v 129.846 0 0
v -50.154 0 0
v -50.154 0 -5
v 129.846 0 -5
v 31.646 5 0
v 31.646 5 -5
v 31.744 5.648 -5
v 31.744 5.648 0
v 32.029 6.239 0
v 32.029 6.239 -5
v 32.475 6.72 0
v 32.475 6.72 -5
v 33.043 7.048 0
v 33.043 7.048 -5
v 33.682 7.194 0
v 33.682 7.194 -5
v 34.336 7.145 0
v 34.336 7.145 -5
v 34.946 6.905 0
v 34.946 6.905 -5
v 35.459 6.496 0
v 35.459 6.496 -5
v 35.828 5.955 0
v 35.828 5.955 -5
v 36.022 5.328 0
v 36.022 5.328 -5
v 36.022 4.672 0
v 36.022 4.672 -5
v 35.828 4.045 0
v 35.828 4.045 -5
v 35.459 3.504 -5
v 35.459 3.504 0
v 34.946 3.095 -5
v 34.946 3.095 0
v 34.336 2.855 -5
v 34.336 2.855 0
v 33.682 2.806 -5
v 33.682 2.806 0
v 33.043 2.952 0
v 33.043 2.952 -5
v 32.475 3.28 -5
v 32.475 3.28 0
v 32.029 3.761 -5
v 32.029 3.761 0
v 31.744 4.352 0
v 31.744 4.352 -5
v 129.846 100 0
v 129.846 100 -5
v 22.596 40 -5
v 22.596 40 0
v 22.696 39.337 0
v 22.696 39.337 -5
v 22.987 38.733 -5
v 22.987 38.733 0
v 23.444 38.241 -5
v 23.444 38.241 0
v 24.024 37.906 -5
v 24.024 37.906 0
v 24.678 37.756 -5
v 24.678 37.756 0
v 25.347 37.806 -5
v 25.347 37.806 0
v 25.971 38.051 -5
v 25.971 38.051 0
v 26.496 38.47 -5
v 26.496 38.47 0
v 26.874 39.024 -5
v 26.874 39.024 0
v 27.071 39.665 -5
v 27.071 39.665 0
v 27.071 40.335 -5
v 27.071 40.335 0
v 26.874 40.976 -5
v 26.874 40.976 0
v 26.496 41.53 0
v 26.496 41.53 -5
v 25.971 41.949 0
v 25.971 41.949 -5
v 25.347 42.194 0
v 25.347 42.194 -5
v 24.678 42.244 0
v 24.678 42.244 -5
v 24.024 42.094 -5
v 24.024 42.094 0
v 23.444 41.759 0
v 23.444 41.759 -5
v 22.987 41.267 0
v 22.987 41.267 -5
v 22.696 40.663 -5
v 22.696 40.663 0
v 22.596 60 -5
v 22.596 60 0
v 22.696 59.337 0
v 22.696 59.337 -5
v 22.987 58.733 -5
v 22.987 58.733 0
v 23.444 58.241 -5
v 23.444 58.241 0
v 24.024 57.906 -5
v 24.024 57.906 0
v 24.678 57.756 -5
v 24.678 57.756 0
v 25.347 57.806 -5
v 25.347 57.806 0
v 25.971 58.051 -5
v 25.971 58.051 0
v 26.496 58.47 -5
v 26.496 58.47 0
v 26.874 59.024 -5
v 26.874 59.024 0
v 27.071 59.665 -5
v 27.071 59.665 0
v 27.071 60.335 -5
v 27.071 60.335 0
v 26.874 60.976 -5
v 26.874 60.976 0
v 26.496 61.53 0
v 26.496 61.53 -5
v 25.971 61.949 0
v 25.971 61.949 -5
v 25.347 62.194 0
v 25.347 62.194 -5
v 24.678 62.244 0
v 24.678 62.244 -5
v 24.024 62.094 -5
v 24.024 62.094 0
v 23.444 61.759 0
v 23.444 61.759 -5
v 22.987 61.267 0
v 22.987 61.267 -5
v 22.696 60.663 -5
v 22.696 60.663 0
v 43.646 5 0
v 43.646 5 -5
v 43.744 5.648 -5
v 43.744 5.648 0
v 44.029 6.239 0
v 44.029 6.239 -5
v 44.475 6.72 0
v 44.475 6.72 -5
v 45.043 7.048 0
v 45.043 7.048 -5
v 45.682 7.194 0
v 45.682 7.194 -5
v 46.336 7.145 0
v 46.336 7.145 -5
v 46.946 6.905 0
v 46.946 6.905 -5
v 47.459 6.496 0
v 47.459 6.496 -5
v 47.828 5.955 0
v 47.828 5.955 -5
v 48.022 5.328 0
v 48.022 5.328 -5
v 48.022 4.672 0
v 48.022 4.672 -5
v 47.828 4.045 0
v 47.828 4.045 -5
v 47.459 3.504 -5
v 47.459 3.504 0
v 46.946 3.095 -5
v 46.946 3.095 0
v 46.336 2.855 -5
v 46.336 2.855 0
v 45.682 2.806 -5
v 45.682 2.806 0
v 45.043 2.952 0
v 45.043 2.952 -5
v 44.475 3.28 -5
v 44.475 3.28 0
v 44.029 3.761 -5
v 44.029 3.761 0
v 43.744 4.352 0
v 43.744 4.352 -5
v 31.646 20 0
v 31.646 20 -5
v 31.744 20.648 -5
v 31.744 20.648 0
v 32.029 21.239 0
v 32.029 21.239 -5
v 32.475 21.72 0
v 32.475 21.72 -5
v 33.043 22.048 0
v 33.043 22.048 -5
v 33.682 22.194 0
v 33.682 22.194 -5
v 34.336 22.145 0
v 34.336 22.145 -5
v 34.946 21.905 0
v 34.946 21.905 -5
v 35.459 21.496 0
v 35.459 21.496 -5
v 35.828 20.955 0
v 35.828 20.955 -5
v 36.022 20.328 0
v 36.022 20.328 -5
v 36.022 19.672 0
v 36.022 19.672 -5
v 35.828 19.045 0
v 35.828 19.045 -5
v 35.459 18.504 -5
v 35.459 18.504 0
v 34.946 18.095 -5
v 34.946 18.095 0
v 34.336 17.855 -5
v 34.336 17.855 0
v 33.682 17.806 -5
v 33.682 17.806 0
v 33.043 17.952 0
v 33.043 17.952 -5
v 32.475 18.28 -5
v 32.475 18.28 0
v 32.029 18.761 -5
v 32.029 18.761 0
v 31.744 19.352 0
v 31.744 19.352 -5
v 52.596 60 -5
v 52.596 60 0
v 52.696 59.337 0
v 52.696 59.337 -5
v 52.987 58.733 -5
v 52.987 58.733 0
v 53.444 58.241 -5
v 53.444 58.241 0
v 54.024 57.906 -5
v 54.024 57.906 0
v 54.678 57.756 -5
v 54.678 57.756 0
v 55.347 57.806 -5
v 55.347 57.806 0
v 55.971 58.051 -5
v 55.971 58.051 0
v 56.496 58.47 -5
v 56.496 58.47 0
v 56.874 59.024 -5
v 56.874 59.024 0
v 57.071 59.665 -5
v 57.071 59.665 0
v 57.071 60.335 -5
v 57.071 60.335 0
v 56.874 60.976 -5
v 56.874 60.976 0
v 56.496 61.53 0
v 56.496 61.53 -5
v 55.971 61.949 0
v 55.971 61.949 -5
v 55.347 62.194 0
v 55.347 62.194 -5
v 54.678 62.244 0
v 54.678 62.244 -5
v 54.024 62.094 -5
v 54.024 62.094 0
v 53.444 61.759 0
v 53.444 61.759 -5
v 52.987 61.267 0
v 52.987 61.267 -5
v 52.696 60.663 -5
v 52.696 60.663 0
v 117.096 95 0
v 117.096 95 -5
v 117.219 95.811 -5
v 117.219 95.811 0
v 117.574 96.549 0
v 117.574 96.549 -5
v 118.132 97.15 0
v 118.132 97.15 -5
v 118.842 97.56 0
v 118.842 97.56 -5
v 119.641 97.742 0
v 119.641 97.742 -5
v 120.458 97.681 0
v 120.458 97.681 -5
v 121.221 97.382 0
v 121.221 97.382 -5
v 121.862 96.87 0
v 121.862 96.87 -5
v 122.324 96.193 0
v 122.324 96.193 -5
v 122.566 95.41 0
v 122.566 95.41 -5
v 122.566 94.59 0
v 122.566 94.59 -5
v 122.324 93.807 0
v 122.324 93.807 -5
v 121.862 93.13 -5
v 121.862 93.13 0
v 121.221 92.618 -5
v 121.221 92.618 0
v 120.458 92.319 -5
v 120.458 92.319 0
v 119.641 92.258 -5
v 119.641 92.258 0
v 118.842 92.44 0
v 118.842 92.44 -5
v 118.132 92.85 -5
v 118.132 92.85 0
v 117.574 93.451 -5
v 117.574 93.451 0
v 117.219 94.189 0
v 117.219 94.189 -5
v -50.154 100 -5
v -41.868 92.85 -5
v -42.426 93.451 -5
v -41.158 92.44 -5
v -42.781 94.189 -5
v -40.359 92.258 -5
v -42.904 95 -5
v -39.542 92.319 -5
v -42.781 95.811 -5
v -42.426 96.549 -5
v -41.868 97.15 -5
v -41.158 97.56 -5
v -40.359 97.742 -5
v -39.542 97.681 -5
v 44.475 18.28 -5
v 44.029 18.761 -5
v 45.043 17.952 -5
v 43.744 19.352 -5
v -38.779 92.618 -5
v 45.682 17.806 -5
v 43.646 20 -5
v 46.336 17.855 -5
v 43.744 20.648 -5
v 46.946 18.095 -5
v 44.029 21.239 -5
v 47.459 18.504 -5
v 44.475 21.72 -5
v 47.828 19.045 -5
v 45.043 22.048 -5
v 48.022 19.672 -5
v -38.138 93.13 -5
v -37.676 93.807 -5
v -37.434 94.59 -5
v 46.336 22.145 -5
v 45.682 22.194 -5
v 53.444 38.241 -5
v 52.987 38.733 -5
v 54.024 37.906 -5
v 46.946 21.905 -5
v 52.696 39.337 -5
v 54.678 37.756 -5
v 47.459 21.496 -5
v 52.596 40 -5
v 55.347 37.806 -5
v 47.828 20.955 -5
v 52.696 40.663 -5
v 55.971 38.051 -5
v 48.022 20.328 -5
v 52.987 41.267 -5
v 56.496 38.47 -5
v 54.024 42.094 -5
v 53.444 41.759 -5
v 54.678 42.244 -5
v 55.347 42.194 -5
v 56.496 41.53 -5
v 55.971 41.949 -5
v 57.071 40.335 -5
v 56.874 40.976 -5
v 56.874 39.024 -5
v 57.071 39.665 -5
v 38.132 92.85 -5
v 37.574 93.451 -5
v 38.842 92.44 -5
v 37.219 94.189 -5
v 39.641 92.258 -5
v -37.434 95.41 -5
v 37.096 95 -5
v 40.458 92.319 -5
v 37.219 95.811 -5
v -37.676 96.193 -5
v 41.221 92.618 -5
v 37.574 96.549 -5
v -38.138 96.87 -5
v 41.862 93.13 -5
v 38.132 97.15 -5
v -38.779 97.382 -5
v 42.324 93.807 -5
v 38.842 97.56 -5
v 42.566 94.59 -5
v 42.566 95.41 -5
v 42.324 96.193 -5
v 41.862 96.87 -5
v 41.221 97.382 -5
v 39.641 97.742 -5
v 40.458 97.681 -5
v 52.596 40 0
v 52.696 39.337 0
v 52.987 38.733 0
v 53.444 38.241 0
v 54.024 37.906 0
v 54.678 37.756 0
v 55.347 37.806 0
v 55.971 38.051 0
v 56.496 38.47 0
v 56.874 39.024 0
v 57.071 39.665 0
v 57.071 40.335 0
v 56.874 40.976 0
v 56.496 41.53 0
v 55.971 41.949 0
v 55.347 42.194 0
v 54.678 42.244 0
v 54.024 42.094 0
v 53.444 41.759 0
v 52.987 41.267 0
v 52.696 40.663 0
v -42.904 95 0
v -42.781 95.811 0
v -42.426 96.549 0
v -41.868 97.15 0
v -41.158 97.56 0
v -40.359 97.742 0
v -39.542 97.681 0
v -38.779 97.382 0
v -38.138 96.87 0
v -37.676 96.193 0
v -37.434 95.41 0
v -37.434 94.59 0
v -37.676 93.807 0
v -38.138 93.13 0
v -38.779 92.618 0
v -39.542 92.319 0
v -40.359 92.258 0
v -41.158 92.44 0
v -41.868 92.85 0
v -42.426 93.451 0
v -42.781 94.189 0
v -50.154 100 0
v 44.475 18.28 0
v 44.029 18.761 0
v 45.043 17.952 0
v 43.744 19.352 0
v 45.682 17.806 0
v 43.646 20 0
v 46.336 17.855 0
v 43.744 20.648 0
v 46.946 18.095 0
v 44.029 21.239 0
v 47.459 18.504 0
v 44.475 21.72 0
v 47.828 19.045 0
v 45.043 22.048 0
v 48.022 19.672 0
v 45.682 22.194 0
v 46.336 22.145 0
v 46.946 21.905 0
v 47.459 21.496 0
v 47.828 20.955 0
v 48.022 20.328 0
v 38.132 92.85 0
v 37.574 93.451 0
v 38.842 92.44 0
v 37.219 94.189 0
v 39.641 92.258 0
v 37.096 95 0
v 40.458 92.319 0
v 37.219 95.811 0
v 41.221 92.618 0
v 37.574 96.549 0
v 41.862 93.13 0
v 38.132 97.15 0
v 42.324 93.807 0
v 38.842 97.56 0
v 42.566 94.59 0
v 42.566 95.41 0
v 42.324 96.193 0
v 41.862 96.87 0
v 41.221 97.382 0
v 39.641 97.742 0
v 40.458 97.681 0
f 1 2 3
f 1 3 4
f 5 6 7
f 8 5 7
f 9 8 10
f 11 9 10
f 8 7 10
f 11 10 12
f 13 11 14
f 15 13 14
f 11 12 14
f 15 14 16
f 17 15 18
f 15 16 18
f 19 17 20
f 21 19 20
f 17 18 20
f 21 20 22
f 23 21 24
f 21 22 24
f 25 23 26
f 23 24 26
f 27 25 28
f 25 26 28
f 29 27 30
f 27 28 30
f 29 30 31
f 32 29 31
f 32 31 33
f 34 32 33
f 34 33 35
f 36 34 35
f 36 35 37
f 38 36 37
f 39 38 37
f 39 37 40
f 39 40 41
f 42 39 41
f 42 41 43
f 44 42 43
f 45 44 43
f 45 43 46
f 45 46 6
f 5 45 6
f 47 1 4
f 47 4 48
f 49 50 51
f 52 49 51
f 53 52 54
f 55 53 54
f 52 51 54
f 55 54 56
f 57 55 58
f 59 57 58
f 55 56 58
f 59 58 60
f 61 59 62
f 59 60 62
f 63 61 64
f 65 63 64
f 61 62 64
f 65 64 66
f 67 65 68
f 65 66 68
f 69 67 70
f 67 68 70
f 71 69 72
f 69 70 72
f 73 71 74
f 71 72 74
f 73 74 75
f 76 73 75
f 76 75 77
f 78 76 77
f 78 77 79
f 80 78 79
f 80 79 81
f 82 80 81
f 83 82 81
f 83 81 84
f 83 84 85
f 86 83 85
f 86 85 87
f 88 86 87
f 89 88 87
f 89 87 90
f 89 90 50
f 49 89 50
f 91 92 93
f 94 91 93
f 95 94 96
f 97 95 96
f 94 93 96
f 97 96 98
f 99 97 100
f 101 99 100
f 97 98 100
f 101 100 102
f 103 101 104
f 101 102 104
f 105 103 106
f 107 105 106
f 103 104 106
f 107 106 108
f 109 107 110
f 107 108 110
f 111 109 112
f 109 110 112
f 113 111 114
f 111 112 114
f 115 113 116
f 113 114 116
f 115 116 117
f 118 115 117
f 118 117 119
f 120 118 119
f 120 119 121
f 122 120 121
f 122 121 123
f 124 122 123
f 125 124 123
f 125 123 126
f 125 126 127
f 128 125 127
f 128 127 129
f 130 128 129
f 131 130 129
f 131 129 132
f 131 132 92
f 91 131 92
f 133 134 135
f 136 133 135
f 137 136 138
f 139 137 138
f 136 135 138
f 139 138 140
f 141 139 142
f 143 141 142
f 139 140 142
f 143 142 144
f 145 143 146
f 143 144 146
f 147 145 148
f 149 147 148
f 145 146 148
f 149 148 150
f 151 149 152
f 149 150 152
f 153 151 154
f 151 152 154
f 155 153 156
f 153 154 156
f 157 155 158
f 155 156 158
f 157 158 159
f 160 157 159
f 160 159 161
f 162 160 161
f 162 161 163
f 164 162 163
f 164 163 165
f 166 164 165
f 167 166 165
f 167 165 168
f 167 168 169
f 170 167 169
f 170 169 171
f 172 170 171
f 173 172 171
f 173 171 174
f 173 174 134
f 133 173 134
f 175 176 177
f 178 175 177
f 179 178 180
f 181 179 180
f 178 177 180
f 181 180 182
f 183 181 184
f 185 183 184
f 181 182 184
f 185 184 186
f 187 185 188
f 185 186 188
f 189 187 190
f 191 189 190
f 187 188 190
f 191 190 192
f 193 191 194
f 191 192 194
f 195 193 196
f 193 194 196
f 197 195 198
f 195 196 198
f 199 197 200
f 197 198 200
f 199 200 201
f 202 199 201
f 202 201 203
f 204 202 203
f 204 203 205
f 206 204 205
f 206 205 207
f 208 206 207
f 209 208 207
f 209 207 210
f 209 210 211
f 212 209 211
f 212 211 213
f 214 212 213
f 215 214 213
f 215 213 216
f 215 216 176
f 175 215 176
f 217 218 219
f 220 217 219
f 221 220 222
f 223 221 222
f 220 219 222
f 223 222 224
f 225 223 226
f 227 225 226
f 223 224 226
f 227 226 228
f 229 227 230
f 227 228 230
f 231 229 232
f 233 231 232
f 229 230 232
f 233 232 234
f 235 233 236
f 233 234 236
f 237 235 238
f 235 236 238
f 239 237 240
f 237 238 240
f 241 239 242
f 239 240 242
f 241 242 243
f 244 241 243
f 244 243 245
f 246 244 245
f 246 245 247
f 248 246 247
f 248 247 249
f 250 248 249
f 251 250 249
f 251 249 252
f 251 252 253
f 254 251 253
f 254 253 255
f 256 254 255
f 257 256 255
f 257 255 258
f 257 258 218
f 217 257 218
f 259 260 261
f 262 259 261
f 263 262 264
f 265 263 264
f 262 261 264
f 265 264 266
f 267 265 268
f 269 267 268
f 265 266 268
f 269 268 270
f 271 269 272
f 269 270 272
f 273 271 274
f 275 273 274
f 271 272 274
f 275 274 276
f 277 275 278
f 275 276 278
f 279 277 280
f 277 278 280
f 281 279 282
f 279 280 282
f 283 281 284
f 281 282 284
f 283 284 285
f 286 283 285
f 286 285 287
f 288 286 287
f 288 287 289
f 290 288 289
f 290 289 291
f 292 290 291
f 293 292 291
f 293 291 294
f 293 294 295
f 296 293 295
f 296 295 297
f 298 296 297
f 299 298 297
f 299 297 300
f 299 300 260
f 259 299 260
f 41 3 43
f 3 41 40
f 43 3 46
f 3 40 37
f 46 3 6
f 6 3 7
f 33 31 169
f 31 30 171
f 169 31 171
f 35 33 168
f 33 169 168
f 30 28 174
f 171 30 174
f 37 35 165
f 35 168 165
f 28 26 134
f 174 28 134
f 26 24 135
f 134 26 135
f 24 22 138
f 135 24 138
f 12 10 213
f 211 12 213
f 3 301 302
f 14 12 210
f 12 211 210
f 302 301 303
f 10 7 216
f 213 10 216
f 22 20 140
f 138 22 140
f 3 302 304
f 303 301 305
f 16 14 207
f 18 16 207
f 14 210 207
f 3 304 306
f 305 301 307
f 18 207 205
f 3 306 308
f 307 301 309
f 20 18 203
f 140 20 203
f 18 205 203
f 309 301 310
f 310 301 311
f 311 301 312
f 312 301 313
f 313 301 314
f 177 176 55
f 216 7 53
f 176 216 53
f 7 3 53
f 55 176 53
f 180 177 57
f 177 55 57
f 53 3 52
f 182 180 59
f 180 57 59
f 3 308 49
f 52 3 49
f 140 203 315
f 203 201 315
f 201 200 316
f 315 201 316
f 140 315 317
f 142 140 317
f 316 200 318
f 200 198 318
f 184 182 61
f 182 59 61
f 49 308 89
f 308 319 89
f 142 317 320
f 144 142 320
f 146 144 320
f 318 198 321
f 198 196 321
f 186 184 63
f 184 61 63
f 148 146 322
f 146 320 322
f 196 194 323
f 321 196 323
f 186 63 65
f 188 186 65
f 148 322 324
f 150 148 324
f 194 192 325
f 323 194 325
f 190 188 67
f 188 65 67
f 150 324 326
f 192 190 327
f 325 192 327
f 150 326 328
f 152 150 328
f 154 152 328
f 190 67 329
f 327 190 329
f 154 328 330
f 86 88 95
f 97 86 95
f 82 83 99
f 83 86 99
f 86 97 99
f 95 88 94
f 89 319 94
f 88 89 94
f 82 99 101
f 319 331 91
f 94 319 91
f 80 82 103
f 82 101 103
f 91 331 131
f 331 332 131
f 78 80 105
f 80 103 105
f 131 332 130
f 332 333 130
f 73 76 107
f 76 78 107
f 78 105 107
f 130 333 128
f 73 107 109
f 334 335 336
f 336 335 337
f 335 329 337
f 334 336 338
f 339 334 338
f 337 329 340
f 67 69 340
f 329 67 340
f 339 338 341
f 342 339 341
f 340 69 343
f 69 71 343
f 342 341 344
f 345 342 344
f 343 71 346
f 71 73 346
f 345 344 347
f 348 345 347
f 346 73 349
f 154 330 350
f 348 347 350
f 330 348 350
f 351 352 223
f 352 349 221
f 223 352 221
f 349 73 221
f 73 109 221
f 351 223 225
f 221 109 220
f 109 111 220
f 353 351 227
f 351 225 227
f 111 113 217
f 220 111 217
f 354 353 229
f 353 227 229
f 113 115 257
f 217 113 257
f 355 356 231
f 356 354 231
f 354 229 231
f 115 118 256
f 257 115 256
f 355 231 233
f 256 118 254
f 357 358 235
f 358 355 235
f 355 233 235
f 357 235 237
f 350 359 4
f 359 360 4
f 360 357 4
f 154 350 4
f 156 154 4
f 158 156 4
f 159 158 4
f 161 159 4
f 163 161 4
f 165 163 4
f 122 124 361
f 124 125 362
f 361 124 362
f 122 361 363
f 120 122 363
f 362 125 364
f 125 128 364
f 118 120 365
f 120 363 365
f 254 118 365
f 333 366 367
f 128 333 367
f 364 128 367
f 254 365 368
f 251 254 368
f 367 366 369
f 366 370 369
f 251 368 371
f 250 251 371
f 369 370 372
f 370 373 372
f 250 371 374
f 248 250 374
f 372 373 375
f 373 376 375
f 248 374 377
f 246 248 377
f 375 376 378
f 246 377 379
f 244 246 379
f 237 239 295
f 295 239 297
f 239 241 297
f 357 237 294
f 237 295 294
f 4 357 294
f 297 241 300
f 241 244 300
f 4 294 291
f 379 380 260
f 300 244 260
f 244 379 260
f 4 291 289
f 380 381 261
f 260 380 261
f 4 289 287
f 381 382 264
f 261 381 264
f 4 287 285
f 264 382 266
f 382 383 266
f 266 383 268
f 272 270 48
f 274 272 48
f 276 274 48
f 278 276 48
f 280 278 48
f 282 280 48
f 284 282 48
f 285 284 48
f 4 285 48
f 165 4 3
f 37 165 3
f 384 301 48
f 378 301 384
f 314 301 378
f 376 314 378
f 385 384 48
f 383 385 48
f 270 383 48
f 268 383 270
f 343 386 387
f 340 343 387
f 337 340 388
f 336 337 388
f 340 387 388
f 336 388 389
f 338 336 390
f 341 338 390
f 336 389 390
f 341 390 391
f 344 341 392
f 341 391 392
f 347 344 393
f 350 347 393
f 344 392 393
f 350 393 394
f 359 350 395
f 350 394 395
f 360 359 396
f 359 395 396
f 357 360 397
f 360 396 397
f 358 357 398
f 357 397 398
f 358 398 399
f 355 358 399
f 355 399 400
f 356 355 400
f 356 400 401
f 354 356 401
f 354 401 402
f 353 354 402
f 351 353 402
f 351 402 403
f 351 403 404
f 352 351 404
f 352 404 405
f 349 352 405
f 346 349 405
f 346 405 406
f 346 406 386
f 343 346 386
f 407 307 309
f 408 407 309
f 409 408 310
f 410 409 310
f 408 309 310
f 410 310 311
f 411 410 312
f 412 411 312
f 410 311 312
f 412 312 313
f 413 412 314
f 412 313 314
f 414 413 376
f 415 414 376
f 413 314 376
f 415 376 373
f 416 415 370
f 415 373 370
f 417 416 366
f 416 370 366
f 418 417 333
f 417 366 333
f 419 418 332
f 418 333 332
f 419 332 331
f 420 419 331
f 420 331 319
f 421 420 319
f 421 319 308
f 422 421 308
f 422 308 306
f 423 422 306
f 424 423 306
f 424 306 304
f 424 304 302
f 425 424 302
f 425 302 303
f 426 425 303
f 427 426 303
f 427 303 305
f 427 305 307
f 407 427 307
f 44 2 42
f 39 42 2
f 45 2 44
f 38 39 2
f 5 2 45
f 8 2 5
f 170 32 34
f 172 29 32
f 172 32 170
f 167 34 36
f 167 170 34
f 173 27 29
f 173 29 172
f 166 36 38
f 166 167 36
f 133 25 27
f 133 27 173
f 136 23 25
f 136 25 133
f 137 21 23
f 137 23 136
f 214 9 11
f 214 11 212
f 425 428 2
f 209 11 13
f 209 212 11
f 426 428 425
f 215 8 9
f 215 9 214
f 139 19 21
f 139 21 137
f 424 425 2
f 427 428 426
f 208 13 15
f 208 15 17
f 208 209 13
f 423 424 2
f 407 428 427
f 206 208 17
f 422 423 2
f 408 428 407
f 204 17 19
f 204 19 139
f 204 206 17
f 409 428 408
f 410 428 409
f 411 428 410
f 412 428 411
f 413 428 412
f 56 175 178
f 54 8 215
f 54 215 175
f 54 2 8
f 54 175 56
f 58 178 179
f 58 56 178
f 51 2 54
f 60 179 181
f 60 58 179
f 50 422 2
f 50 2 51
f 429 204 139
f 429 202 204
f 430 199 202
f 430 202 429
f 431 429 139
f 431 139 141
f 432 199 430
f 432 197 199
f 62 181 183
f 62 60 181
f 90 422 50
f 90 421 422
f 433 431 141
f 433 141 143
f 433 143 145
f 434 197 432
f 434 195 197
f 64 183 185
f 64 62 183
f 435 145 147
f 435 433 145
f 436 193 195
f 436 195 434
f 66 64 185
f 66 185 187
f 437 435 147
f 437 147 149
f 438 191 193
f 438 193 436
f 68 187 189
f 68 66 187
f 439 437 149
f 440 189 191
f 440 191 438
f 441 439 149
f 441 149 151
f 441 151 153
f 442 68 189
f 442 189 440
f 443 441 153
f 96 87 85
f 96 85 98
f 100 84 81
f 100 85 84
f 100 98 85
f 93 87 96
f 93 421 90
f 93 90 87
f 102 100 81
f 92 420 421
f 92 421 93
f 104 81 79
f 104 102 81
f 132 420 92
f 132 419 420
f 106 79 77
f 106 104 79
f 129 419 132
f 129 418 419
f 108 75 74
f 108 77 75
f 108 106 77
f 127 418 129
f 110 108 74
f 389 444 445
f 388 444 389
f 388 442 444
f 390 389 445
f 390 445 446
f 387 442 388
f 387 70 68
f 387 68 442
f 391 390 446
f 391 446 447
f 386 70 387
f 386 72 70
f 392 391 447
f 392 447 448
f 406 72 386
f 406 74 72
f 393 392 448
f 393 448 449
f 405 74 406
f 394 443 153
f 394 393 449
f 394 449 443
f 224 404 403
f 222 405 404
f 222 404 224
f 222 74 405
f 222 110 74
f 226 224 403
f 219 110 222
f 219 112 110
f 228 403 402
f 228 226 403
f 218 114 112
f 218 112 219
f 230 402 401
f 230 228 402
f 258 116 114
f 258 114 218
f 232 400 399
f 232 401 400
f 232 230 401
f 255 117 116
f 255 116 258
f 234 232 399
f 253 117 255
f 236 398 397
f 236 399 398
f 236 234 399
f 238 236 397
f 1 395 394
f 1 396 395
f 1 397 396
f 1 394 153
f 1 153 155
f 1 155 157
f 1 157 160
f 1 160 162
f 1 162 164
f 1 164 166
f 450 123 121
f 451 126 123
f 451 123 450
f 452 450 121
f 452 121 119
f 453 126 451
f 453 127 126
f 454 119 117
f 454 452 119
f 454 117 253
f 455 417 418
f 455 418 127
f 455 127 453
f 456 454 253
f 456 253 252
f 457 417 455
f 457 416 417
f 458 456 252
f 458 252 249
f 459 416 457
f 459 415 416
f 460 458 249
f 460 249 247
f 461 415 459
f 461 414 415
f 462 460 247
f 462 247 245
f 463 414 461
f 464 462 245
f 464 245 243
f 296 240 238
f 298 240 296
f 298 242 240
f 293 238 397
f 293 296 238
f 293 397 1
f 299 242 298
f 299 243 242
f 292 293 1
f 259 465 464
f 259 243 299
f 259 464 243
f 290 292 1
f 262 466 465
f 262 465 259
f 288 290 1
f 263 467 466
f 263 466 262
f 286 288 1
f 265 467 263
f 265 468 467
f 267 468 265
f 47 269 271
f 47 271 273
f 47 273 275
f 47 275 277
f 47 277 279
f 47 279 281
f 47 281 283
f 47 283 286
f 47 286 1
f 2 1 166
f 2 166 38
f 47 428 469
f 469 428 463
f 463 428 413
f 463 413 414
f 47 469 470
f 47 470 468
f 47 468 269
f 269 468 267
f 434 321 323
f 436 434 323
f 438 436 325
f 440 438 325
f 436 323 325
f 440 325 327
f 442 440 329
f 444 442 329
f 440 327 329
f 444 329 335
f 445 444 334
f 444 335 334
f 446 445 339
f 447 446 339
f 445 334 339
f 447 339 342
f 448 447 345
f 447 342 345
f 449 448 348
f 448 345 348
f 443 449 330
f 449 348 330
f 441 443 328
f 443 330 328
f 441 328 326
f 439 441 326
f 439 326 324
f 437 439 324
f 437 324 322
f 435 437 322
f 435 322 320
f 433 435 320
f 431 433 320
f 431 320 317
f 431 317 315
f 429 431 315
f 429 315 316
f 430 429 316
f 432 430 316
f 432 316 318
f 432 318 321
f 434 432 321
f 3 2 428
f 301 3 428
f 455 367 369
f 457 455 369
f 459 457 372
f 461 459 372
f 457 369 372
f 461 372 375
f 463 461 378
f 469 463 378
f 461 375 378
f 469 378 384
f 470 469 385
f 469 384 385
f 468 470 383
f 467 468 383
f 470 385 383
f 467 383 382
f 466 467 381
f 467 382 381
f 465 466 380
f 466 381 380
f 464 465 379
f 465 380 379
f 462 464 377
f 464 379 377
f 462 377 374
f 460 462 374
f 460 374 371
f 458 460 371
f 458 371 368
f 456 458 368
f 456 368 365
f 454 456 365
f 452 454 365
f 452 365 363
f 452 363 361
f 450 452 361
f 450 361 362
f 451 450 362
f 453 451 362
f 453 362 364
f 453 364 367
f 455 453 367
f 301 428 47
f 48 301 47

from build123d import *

# Parameters (mm, degrees)
F0_W     = 180
F0_H     = 100
F2_DEPTH = 5
F3_D     = 5.5
F5_D     = 4.5
F7_D     = 4.4
F7_DEPTH = 12
F7_TIP   = 1.3218933619


with BuildPart() as f2:
    # F0 (on Top) → F2 (new body)
    with BuildSketch(Plane.XY):
        with Locations((39.8463645577, 50)):
            Rectangle(F0_W, F0_H)
    extrude(amount=-F2_DEPTH)

    # F3 (through all)
    with Locations(Plane.XY):
        with Locations((-140.1536354423, 95), (-40.1536354423, 95), (119.8463645577, 95), (219.8463645577, 95), (39.8463645577, 95)):
            Hole(F3_D / 2)

    # F5 (through all)
    with Locations(Plane(origin=(0, 0, -5), x_dir=(1, 0, 0), z_dir=(0, 0, -1))):
        with Locations((24.8463645577, -40), (54.8463645577, -40), (54.8463645577, -60), (24.8463645577, -60)):
            Hole(F5_D / 2)

    # F7
    with Locations(Plane.XY):
        with Locations((33.8463645577, 20), (45.8463645577, 20), (45.8463645577, 5), (33.8463645577, 5)):
            Hole(F7_D / 2, depth=F7_DEPTH)
            with Locations((0, 0, -(F7_DEPTH + F7_TIP / 2))):  # 118° drill point
                Cone(0, F7_D / 2, F7_TIP, mode=Mode.SUBTRACT)


solid = f2.part
